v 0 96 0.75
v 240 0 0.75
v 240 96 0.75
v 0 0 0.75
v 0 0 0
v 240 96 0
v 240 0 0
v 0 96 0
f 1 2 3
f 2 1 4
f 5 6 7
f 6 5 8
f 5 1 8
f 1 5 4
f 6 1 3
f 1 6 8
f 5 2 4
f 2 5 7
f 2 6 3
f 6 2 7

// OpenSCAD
// file: lumber.scad
use <utilities.scad>;

// Stick
module stick_2x4x8(cut = [0, 0, 0]) {
  echo("stick_2x4x8");
  cube([inches(1, 1 / 2) - cut[0], inches(3, 1 / 2) - cut[1], feet(8) - cut[2]]);
}
;

module stick_2x6x8(cut = [0, 0, 0]) {
  echo("stick_2x6x8");
  cube([inches(1, 1 / 2) - cut[0], inches(5, 1 / 2) - cut[1], feet(8) - cut[2]]);
}
;

// Sheet
module stick_4x8x1_2(cut = [0, 0, 0]) {
  echo("4x8x1/2");
  cube([feet(4) - cut[0], feet(8) - cut[1], inches(0, 1 / 2) - cut[2]]);
}
;

module stick_4x8x3_4(cut = [0, 0, 0]) {
  echo("4x8x3/4");
  cube([feet(4) - cut[0], feet(8) - cut[1], inches(0, 3 / 4) - cut[2]]);
}
;

stick_2x4x8();

translate([24, 0, 0])
  stick_2x6x8();

translate([48, 0, 0])
  stick_4x8x1_2();

translate([120, 0, 0])
  stick_4x8x3_4();
// file: utilities.scad
function feet(f) = f * 12;
function inches(i = 0, f = 0) = i + f;
// main file
use <utilities.scad>;
use <lumber.scad>;

module sheet_floor(start_height = 0, width = feet(20), depth = feet(8)) {
  trim_depth = depth < feet(8) ? feet(8) - depth : 0;

  for (x = [0:feet(4):width]) {
    trim = x + feet(4) > width ? [x + feet(4) - width, trim_depth, 0] : [0, trim_depth, 0];

    translate([x, 0, start_height])
      stick_4x8x3_4(cut=trim);
  }
}

sheet_floor();
